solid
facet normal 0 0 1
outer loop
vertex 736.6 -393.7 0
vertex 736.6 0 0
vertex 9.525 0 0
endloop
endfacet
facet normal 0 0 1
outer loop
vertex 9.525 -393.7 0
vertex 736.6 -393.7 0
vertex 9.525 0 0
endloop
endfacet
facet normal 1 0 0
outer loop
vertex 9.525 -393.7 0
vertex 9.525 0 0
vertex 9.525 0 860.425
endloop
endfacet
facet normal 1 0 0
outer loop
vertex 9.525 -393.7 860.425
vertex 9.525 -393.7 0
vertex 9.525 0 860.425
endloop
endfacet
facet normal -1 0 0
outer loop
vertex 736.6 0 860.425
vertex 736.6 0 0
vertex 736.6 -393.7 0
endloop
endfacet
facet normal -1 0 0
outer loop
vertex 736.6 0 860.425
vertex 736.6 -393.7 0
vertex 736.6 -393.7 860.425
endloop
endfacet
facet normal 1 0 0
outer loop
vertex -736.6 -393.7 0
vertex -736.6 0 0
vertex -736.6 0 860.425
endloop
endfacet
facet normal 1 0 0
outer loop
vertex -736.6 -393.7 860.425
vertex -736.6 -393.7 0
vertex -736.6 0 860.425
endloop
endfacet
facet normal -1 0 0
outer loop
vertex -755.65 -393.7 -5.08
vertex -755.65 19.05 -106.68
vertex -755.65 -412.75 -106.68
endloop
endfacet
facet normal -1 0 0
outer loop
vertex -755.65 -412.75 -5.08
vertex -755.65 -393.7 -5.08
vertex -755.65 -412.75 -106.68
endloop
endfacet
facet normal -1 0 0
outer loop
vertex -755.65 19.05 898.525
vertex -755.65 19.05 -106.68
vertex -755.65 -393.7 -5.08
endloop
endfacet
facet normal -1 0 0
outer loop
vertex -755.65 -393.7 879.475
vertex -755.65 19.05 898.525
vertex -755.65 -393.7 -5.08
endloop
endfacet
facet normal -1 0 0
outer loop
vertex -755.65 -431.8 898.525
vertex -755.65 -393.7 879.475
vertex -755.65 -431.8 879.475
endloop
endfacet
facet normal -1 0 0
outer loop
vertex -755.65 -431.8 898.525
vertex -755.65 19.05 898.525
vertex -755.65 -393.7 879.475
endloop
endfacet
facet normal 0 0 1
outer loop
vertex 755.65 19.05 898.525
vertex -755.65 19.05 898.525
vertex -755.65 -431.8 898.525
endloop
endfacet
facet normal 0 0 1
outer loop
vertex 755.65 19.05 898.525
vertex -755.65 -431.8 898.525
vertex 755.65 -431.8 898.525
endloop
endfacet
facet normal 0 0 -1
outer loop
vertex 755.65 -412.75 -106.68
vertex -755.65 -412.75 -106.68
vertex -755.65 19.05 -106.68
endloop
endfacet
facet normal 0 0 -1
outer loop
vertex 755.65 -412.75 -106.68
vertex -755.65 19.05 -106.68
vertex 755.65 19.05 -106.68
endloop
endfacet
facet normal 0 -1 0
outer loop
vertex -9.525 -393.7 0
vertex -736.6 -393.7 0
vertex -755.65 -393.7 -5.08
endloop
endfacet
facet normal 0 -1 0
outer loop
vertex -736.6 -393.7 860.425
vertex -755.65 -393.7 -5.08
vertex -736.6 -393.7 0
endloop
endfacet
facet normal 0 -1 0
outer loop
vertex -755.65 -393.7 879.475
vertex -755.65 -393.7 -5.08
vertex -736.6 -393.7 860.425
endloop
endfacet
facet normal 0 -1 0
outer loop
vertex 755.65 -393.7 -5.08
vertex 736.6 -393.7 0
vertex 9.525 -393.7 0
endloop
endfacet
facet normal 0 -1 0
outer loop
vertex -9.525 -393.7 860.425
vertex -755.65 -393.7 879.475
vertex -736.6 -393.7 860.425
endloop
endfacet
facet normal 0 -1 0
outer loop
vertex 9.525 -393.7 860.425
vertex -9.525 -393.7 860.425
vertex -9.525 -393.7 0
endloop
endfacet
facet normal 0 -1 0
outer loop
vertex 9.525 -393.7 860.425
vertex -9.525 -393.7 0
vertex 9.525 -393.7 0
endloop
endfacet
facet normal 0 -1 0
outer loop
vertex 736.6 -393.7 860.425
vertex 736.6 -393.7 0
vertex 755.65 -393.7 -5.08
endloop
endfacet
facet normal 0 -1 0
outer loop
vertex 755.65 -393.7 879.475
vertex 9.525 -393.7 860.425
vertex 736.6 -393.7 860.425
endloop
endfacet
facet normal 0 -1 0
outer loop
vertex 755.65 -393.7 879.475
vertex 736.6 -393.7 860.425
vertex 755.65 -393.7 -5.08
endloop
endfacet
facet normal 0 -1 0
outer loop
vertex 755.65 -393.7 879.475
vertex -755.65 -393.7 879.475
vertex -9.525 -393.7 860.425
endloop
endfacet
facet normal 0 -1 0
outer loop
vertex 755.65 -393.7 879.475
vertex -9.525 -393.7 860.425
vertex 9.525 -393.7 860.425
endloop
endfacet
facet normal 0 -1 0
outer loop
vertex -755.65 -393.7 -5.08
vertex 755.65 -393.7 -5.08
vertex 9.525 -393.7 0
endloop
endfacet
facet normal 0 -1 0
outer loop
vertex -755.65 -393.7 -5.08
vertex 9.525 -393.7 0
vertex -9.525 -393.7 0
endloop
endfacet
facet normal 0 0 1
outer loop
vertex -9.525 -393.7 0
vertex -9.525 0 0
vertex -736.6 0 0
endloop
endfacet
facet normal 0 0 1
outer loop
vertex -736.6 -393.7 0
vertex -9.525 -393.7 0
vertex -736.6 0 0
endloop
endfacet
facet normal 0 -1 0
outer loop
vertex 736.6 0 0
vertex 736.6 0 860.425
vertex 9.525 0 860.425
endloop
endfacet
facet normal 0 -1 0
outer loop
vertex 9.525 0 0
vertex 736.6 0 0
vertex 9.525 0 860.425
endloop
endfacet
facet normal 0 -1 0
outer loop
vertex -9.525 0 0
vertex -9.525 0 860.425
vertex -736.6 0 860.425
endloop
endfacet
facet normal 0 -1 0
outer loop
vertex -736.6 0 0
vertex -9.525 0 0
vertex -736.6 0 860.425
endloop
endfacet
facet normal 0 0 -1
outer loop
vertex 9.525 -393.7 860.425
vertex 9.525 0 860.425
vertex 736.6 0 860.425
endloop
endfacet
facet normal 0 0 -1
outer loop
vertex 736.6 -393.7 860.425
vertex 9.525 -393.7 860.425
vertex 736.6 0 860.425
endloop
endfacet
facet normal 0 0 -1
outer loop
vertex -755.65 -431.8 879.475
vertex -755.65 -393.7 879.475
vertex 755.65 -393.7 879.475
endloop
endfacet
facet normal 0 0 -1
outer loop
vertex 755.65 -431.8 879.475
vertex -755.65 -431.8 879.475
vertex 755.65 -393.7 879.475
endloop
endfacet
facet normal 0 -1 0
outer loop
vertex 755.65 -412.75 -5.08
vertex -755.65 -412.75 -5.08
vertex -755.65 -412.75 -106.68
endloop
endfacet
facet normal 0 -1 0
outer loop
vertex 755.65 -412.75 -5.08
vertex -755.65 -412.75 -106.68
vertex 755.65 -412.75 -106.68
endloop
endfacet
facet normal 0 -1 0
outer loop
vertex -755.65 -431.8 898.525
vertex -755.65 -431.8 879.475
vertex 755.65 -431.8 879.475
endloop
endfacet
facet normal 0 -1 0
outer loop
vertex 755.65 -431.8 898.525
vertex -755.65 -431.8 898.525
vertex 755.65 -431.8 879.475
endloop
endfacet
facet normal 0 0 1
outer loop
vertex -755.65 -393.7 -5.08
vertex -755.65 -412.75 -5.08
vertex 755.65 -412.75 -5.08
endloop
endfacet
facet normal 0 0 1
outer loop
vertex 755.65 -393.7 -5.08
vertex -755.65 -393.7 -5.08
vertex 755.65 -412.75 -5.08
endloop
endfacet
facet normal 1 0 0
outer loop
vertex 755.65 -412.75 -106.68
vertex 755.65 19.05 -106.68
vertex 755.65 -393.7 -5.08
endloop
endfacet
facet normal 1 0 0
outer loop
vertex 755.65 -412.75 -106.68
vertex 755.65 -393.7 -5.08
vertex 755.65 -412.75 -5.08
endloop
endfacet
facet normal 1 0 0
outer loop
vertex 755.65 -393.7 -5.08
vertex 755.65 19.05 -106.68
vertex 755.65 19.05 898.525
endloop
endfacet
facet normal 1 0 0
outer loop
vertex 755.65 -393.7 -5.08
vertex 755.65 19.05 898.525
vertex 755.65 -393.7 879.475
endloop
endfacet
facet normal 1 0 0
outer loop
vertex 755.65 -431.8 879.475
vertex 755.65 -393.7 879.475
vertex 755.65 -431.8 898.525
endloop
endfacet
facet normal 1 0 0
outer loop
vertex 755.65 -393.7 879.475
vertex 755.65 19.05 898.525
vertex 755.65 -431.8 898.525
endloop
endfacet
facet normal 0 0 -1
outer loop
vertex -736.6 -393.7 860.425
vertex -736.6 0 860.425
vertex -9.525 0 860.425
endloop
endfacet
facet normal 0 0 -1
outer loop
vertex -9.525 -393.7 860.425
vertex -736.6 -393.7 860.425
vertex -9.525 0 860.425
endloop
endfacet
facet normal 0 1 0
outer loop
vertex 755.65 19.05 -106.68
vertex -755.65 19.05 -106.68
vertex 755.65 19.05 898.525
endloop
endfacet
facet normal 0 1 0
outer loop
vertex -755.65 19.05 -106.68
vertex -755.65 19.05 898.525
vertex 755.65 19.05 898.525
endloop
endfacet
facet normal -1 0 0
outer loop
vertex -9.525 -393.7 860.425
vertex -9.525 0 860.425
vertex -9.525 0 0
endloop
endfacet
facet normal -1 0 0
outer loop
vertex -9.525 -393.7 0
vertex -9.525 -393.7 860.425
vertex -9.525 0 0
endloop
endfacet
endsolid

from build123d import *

# Parameters (mm, degrees)
F0_W     = 19.05
F0_H     = 860.425
F1_DEPTH = 393.7
F2_W     = 1511.3
F2_H     = 884.555
F3_DEPTH = 19.05
F4_W     = 1511.3
F4_H     = 450.85
F5_DEPTH = 19.05
F6_W     = 1511.3
F6_H     = 431.8
F7_DEPTH = 101.6


with BuildPart() as f1:
    # F0 (on Front) → F1 (new body)
    with BuildSketch(Plane.XZ):
        Polygon((0, 879.475), (0, 860.425), (9.525, 860.425), (736.6, 860.425), (755.65, 860.425), (755.65, 879.475), align=None)
        Polygon((-9.525, 860.425), (0, 860.425), (0, 879.475), (-755.65, 879.475), (-755.65, 860.425), (-736.6, 860.425), align=None)
        with Locations((746.125, 430.2125)):
            Rectangle(F0_W, F0_H)
        Polygon((736.6, 0), (9.525, 0), (0, 0), (-9.525, 0), (-736.6, 0), (-755.65, 0), (-755.65, -5.08), (755.65, -5.08), (755.65, 0), align=None)
        with Locations((-746.125, 430.2125)):
            Rectangle(F0_W, F0_H)
        Polygon((9.525, 860.425), (0, 860.425), (-9.525, 860.425), (-9.525, 0), (0, 0), (9.525, 0), align=None)
    extrude(amount=F1_DEPTH)

    # F2 (on face) → F3 (join)
    with BuildSketch(Plane(origin=(0, 0, 0), x_dir=(-1, 0, 0), z_dir=(0, 1, 0))):
        with Locations((0, 437.1975)):
            Rectangle(F2_W, F2_H)
    extrude(amount=F3_DEPTH)

    # F4 (on face) → F5 (join)
    with BuildSketch(Plane.XY.offset(879.475)):
        with Locations((0, -206.375)):
            Rectangle(F4_W, F4_H)
    extrude(amount=F5_DEPTH)

    # F6 (on face) → F7 (join)
    with BuildSketch(Plane(origin=(0, 0, -5.08), x_dir=(1, 0, 0), z_dir=(0, 0, -1))):
        with Locations((0, 196.85)):
            Rectangle(F6_W, F6_H)
    extrude(amount=F7_DEPTH)


solid = f1.part
